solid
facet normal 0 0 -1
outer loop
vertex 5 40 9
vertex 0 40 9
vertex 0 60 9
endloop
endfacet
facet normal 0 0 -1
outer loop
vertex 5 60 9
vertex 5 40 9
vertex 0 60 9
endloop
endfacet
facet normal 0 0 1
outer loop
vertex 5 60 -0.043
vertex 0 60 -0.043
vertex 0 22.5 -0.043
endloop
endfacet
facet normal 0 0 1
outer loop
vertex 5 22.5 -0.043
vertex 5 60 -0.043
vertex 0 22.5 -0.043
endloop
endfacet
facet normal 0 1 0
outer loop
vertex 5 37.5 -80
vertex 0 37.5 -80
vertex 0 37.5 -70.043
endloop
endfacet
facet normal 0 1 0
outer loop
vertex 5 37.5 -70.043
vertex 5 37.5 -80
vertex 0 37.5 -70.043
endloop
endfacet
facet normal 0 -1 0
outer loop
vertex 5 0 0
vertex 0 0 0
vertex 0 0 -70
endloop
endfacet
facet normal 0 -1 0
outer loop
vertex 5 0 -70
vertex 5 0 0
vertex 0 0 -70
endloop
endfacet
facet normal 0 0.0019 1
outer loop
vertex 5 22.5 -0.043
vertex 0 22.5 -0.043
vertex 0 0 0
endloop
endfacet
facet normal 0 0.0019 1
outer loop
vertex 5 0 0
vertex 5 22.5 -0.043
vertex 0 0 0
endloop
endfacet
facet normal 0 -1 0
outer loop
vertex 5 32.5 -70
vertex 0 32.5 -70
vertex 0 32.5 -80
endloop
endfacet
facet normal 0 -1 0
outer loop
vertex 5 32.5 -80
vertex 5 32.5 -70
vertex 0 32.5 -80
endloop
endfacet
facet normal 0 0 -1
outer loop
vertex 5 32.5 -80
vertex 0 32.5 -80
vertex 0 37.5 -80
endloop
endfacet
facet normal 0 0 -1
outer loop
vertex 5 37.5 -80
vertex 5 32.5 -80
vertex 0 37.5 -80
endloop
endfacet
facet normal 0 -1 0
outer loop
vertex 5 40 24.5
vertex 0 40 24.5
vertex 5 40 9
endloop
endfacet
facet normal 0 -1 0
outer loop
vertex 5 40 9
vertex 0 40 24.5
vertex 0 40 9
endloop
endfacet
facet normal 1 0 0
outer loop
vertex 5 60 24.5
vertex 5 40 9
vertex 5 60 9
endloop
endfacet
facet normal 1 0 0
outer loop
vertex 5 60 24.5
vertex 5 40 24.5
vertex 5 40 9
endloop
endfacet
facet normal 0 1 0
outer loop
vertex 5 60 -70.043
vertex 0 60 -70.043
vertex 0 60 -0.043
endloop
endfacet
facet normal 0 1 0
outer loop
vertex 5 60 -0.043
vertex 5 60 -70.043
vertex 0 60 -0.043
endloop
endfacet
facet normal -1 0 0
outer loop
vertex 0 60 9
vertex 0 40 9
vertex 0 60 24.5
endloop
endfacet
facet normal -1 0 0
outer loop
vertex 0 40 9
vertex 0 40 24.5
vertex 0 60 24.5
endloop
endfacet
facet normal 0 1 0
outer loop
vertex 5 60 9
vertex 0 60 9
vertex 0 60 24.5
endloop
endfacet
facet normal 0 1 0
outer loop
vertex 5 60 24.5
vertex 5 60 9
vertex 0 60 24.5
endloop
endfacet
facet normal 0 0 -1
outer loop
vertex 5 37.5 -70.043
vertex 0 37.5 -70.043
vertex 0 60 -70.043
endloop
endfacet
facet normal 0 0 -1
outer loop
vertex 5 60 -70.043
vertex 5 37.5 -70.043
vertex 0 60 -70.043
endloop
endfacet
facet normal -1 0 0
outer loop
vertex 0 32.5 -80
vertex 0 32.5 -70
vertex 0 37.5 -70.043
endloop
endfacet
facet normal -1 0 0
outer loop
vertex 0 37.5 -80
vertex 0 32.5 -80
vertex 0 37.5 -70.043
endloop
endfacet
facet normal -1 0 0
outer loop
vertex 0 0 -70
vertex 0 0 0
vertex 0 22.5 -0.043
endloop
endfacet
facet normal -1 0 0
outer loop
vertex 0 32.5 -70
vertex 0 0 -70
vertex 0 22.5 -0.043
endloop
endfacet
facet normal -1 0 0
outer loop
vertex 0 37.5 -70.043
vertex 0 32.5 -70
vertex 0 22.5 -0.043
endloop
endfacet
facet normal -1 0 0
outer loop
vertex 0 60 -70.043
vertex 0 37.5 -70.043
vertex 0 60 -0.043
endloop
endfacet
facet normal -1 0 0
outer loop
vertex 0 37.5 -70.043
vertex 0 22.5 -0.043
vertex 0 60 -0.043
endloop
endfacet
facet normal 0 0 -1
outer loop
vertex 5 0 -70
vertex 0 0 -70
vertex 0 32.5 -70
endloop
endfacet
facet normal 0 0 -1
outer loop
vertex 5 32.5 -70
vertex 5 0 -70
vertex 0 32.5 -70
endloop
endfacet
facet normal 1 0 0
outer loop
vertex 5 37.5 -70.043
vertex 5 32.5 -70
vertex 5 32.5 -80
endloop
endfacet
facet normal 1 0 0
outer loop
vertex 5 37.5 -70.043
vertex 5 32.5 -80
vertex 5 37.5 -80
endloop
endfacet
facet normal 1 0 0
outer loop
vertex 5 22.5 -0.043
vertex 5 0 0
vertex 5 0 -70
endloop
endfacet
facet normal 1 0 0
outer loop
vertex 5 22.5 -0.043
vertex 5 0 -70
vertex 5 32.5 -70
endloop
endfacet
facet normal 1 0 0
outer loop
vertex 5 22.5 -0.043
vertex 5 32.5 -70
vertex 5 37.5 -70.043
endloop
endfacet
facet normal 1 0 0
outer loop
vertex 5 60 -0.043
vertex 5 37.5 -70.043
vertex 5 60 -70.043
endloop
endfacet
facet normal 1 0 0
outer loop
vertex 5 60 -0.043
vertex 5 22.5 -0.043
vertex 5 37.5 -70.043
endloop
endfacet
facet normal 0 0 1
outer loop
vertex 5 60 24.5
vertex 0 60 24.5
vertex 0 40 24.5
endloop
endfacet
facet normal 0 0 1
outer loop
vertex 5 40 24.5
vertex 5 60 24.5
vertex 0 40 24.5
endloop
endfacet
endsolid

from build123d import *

# Parameters (mm, degrees)
F1_DEPTH = 5


# Not quite as in the source:
# - a feature names something its author has since deleted; it is built from what else it names


with BuildPart() as f1:
    # F0 (on Right) → F1 (new body)
    with BuildSketch(Plane.YZ):
        Polygon((22.5, -0.0434386059), (0, 0), (0, -70), (12, -70), (12.4011761725, -70), (32.5, -70), (32.5, -80), (37.5, -80), (37.5, -70.0434386059), (60, -70.0434386059), (60, -0.0434386059), align=None)
    extrude(amount=F1_DEPTH)


with BuildPart() as f1b:
    # F0 (on Right) → F1, piece 2 (new body)
    with BuildSketch(Plane.YZ):
        Polygon((40, 8.9999613941), (42.5, 8.9999613941), (60, 8.9999613941), (60, 24.499980697), (42.5, 24.499980697), (40, 24.499980697), align=None)
    extrude(amount=F1_DEPTH)


solid = Compound([f1.part, f1b.part])
